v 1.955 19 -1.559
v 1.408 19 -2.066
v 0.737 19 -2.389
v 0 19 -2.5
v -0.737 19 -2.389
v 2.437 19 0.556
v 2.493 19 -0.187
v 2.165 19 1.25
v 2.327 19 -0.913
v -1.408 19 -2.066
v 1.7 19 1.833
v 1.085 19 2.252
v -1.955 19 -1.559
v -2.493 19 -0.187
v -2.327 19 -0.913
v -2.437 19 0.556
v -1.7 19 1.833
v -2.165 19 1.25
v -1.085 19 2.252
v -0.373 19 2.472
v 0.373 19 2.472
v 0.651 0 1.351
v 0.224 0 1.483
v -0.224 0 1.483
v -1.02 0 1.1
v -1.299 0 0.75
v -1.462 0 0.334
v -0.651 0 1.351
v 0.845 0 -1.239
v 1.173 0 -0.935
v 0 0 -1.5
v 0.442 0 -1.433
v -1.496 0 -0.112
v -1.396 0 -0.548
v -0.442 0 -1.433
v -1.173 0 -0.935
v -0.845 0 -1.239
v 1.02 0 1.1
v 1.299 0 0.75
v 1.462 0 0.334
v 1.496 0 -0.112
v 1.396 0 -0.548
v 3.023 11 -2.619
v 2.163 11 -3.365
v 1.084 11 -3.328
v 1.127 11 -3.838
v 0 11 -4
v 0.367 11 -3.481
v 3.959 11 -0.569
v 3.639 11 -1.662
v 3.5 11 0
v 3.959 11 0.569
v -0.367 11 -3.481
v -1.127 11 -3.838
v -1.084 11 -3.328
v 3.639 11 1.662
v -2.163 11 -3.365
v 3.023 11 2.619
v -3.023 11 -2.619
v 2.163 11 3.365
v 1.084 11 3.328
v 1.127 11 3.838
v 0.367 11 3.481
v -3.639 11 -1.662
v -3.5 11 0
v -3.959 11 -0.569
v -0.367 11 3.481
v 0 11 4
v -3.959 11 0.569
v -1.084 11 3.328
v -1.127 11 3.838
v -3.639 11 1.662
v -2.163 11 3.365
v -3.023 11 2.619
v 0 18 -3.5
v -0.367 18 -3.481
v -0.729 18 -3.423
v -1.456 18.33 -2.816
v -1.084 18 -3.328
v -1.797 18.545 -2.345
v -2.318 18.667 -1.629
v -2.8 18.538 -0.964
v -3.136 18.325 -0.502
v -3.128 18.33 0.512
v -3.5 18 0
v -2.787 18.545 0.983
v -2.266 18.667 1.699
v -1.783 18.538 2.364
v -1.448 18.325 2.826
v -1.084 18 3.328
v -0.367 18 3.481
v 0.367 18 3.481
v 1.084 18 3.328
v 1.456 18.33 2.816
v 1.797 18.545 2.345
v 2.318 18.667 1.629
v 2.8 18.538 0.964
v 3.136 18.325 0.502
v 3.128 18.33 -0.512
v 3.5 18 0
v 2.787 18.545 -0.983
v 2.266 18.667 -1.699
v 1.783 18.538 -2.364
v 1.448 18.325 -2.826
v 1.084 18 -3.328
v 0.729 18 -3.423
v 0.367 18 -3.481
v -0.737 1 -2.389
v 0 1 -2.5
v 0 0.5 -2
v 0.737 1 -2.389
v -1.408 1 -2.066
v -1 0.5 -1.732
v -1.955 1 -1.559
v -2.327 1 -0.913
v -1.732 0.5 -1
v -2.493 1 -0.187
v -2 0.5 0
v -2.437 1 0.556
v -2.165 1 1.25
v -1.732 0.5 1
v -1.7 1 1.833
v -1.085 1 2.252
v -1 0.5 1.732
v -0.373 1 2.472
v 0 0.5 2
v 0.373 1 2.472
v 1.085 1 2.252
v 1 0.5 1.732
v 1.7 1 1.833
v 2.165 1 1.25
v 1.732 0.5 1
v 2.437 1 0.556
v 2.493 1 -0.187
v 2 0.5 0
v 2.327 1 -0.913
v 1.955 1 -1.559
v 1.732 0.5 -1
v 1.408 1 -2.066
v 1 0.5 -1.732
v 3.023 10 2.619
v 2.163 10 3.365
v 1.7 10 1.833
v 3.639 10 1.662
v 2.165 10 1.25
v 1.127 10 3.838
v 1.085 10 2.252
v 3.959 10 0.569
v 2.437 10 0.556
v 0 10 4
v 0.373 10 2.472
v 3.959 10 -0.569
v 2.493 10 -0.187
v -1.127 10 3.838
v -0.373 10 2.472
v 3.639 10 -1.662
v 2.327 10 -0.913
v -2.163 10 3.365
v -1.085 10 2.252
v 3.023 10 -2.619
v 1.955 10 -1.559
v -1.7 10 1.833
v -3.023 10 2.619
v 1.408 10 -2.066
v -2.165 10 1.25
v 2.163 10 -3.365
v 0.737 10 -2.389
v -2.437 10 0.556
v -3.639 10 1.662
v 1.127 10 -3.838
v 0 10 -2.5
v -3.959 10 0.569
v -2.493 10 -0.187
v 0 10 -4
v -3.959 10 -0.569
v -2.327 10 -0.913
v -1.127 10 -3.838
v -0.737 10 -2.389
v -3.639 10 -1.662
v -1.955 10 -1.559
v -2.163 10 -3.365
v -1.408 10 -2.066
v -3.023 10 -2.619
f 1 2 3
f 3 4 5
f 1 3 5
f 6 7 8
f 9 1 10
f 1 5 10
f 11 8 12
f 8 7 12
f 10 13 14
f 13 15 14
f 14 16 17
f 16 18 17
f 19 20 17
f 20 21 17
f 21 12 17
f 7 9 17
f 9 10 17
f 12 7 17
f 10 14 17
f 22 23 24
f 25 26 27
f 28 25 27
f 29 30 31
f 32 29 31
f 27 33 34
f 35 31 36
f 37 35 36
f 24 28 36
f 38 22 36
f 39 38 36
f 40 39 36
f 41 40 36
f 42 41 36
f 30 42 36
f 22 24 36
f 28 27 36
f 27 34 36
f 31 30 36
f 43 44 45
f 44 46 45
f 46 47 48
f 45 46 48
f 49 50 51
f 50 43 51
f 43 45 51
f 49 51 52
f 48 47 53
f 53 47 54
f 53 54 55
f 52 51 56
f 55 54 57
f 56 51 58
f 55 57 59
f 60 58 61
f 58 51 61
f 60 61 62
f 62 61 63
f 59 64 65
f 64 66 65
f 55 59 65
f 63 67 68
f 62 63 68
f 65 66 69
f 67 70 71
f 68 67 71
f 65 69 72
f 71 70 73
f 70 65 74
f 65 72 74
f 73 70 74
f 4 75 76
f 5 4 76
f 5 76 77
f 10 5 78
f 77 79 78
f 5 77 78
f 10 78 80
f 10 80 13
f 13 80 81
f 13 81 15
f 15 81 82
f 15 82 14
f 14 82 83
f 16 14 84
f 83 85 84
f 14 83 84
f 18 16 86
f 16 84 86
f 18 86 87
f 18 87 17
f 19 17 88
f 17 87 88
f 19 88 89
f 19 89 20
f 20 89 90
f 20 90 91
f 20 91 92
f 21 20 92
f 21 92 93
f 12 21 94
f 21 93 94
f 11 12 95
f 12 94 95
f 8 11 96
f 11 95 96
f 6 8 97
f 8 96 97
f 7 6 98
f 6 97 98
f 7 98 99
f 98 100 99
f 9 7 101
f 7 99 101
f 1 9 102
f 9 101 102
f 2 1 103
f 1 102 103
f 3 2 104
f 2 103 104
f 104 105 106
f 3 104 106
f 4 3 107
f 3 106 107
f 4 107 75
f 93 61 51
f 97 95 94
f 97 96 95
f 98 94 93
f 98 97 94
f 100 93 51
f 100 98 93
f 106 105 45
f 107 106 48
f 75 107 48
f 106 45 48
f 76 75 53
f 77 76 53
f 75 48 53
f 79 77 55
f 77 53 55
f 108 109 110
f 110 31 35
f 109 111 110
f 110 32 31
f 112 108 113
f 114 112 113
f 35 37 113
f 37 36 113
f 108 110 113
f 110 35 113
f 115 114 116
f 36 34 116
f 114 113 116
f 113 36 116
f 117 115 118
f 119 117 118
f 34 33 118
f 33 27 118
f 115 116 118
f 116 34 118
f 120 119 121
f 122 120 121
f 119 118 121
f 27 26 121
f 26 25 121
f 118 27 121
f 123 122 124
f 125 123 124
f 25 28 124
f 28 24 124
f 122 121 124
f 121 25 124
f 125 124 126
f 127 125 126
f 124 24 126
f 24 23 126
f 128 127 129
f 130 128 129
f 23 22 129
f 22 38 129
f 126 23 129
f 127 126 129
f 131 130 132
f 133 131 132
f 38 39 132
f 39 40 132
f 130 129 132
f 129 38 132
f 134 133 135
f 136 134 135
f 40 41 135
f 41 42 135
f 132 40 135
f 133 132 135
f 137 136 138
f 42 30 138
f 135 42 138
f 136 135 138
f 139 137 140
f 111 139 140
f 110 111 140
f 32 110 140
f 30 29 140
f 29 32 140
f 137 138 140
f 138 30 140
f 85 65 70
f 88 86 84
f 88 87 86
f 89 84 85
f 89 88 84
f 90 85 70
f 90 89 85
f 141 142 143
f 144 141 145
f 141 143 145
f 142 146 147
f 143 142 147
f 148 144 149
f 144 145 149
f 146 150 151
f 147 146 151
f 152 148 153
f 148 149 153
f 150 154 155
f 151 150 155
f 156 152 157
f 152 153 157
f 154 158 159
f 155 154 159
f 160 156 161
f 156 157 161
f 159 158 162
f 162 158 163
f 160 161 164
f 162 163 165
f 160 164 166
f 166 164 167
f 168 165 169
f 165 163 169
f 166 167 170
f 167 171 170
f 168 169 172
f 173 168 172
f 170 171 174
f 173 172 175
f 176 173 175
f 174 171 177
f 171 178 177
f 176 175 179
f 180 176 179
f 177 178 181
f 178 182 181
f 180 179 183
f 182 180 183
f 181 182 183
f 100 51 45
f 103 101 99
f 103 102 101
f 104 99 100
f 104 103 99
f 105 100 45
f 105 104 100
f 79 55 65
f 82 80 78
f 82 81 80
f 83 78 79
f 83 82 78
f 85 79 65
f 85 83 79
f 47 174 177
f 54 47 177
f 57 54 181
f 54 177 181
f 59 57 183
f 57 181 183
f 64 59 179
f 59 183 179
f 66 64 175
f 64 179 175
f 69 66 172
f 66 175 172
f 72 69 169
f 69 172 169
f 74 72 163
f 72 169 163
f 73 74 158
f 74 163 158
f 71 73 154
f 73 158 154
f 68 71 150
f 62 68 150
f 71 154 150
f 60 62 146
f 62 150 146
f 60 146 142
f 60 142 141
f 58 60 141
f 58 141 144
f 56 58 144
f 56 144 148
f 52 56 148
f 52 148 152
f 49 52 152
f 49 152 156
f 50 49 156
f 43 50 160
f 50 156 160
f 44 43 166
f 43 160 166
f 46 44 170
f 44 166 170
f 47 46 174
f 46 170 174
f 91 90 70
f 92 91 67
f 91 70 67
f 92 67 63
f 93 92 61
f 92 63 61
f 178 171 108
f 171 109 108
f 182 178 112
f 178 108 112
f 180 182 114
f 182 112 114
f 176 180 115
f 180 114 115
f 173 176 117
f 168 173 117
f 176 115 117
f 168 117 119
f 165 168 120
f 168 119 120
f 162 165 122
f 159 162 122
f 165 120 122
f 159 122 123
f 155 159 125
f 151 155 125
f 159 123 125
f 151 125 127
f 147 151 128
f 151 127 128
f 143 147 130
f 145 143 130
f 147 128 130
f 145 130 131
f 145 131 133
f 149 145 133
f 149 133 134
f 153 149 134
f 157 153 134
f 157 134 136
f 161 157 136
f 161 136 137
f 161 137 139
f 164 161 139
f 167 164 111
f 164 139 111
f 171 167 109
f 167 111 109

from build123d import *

# Parameters (mm, degrees)
SKETCH_2_R          = 6.282667793
CUT_EXTRUDE_2_DEPTH = 8


with BuildPart() as part:
    # 草图1 → 旋转1 (revolve)
    with BuildSketch(Plane.XY, mode=Mode.PRIVATE) as revolve_1_sk:
        Polygon((0, 0), (0, 19), (2.5, 19), (3.5, 18), (3.5, 11), (4, 11), (4, 10), (2.5, 10), (2.5, 1), (1.5, 0), align=None)
    revolve(revolve_1_sk.sketch.rotate(Axis((0, 0, 0), (0, 1, 0)), 90), axis=Axis((0, 0, 0), (0, 1, 0)))

    # 草图2 → 切除-拉伸2 (cut)
    with BuildSketch(Plane(origin=(0, 19, 0), x_dir=(1, 0, 0), z_dir=(0, 1, 0))):
        Circle(SKETCH_2_R)
        Polygon((0, 4.820824702), (-3.5, 0), (0, -4.820824702), (3.5, 0), align=None, mode=Mode.SUBTRACT)
    extrude(amount=-CUT_EXTRUDE_2_DEPTH, mode=Mode.SUBTRACT)


solid = part.part
